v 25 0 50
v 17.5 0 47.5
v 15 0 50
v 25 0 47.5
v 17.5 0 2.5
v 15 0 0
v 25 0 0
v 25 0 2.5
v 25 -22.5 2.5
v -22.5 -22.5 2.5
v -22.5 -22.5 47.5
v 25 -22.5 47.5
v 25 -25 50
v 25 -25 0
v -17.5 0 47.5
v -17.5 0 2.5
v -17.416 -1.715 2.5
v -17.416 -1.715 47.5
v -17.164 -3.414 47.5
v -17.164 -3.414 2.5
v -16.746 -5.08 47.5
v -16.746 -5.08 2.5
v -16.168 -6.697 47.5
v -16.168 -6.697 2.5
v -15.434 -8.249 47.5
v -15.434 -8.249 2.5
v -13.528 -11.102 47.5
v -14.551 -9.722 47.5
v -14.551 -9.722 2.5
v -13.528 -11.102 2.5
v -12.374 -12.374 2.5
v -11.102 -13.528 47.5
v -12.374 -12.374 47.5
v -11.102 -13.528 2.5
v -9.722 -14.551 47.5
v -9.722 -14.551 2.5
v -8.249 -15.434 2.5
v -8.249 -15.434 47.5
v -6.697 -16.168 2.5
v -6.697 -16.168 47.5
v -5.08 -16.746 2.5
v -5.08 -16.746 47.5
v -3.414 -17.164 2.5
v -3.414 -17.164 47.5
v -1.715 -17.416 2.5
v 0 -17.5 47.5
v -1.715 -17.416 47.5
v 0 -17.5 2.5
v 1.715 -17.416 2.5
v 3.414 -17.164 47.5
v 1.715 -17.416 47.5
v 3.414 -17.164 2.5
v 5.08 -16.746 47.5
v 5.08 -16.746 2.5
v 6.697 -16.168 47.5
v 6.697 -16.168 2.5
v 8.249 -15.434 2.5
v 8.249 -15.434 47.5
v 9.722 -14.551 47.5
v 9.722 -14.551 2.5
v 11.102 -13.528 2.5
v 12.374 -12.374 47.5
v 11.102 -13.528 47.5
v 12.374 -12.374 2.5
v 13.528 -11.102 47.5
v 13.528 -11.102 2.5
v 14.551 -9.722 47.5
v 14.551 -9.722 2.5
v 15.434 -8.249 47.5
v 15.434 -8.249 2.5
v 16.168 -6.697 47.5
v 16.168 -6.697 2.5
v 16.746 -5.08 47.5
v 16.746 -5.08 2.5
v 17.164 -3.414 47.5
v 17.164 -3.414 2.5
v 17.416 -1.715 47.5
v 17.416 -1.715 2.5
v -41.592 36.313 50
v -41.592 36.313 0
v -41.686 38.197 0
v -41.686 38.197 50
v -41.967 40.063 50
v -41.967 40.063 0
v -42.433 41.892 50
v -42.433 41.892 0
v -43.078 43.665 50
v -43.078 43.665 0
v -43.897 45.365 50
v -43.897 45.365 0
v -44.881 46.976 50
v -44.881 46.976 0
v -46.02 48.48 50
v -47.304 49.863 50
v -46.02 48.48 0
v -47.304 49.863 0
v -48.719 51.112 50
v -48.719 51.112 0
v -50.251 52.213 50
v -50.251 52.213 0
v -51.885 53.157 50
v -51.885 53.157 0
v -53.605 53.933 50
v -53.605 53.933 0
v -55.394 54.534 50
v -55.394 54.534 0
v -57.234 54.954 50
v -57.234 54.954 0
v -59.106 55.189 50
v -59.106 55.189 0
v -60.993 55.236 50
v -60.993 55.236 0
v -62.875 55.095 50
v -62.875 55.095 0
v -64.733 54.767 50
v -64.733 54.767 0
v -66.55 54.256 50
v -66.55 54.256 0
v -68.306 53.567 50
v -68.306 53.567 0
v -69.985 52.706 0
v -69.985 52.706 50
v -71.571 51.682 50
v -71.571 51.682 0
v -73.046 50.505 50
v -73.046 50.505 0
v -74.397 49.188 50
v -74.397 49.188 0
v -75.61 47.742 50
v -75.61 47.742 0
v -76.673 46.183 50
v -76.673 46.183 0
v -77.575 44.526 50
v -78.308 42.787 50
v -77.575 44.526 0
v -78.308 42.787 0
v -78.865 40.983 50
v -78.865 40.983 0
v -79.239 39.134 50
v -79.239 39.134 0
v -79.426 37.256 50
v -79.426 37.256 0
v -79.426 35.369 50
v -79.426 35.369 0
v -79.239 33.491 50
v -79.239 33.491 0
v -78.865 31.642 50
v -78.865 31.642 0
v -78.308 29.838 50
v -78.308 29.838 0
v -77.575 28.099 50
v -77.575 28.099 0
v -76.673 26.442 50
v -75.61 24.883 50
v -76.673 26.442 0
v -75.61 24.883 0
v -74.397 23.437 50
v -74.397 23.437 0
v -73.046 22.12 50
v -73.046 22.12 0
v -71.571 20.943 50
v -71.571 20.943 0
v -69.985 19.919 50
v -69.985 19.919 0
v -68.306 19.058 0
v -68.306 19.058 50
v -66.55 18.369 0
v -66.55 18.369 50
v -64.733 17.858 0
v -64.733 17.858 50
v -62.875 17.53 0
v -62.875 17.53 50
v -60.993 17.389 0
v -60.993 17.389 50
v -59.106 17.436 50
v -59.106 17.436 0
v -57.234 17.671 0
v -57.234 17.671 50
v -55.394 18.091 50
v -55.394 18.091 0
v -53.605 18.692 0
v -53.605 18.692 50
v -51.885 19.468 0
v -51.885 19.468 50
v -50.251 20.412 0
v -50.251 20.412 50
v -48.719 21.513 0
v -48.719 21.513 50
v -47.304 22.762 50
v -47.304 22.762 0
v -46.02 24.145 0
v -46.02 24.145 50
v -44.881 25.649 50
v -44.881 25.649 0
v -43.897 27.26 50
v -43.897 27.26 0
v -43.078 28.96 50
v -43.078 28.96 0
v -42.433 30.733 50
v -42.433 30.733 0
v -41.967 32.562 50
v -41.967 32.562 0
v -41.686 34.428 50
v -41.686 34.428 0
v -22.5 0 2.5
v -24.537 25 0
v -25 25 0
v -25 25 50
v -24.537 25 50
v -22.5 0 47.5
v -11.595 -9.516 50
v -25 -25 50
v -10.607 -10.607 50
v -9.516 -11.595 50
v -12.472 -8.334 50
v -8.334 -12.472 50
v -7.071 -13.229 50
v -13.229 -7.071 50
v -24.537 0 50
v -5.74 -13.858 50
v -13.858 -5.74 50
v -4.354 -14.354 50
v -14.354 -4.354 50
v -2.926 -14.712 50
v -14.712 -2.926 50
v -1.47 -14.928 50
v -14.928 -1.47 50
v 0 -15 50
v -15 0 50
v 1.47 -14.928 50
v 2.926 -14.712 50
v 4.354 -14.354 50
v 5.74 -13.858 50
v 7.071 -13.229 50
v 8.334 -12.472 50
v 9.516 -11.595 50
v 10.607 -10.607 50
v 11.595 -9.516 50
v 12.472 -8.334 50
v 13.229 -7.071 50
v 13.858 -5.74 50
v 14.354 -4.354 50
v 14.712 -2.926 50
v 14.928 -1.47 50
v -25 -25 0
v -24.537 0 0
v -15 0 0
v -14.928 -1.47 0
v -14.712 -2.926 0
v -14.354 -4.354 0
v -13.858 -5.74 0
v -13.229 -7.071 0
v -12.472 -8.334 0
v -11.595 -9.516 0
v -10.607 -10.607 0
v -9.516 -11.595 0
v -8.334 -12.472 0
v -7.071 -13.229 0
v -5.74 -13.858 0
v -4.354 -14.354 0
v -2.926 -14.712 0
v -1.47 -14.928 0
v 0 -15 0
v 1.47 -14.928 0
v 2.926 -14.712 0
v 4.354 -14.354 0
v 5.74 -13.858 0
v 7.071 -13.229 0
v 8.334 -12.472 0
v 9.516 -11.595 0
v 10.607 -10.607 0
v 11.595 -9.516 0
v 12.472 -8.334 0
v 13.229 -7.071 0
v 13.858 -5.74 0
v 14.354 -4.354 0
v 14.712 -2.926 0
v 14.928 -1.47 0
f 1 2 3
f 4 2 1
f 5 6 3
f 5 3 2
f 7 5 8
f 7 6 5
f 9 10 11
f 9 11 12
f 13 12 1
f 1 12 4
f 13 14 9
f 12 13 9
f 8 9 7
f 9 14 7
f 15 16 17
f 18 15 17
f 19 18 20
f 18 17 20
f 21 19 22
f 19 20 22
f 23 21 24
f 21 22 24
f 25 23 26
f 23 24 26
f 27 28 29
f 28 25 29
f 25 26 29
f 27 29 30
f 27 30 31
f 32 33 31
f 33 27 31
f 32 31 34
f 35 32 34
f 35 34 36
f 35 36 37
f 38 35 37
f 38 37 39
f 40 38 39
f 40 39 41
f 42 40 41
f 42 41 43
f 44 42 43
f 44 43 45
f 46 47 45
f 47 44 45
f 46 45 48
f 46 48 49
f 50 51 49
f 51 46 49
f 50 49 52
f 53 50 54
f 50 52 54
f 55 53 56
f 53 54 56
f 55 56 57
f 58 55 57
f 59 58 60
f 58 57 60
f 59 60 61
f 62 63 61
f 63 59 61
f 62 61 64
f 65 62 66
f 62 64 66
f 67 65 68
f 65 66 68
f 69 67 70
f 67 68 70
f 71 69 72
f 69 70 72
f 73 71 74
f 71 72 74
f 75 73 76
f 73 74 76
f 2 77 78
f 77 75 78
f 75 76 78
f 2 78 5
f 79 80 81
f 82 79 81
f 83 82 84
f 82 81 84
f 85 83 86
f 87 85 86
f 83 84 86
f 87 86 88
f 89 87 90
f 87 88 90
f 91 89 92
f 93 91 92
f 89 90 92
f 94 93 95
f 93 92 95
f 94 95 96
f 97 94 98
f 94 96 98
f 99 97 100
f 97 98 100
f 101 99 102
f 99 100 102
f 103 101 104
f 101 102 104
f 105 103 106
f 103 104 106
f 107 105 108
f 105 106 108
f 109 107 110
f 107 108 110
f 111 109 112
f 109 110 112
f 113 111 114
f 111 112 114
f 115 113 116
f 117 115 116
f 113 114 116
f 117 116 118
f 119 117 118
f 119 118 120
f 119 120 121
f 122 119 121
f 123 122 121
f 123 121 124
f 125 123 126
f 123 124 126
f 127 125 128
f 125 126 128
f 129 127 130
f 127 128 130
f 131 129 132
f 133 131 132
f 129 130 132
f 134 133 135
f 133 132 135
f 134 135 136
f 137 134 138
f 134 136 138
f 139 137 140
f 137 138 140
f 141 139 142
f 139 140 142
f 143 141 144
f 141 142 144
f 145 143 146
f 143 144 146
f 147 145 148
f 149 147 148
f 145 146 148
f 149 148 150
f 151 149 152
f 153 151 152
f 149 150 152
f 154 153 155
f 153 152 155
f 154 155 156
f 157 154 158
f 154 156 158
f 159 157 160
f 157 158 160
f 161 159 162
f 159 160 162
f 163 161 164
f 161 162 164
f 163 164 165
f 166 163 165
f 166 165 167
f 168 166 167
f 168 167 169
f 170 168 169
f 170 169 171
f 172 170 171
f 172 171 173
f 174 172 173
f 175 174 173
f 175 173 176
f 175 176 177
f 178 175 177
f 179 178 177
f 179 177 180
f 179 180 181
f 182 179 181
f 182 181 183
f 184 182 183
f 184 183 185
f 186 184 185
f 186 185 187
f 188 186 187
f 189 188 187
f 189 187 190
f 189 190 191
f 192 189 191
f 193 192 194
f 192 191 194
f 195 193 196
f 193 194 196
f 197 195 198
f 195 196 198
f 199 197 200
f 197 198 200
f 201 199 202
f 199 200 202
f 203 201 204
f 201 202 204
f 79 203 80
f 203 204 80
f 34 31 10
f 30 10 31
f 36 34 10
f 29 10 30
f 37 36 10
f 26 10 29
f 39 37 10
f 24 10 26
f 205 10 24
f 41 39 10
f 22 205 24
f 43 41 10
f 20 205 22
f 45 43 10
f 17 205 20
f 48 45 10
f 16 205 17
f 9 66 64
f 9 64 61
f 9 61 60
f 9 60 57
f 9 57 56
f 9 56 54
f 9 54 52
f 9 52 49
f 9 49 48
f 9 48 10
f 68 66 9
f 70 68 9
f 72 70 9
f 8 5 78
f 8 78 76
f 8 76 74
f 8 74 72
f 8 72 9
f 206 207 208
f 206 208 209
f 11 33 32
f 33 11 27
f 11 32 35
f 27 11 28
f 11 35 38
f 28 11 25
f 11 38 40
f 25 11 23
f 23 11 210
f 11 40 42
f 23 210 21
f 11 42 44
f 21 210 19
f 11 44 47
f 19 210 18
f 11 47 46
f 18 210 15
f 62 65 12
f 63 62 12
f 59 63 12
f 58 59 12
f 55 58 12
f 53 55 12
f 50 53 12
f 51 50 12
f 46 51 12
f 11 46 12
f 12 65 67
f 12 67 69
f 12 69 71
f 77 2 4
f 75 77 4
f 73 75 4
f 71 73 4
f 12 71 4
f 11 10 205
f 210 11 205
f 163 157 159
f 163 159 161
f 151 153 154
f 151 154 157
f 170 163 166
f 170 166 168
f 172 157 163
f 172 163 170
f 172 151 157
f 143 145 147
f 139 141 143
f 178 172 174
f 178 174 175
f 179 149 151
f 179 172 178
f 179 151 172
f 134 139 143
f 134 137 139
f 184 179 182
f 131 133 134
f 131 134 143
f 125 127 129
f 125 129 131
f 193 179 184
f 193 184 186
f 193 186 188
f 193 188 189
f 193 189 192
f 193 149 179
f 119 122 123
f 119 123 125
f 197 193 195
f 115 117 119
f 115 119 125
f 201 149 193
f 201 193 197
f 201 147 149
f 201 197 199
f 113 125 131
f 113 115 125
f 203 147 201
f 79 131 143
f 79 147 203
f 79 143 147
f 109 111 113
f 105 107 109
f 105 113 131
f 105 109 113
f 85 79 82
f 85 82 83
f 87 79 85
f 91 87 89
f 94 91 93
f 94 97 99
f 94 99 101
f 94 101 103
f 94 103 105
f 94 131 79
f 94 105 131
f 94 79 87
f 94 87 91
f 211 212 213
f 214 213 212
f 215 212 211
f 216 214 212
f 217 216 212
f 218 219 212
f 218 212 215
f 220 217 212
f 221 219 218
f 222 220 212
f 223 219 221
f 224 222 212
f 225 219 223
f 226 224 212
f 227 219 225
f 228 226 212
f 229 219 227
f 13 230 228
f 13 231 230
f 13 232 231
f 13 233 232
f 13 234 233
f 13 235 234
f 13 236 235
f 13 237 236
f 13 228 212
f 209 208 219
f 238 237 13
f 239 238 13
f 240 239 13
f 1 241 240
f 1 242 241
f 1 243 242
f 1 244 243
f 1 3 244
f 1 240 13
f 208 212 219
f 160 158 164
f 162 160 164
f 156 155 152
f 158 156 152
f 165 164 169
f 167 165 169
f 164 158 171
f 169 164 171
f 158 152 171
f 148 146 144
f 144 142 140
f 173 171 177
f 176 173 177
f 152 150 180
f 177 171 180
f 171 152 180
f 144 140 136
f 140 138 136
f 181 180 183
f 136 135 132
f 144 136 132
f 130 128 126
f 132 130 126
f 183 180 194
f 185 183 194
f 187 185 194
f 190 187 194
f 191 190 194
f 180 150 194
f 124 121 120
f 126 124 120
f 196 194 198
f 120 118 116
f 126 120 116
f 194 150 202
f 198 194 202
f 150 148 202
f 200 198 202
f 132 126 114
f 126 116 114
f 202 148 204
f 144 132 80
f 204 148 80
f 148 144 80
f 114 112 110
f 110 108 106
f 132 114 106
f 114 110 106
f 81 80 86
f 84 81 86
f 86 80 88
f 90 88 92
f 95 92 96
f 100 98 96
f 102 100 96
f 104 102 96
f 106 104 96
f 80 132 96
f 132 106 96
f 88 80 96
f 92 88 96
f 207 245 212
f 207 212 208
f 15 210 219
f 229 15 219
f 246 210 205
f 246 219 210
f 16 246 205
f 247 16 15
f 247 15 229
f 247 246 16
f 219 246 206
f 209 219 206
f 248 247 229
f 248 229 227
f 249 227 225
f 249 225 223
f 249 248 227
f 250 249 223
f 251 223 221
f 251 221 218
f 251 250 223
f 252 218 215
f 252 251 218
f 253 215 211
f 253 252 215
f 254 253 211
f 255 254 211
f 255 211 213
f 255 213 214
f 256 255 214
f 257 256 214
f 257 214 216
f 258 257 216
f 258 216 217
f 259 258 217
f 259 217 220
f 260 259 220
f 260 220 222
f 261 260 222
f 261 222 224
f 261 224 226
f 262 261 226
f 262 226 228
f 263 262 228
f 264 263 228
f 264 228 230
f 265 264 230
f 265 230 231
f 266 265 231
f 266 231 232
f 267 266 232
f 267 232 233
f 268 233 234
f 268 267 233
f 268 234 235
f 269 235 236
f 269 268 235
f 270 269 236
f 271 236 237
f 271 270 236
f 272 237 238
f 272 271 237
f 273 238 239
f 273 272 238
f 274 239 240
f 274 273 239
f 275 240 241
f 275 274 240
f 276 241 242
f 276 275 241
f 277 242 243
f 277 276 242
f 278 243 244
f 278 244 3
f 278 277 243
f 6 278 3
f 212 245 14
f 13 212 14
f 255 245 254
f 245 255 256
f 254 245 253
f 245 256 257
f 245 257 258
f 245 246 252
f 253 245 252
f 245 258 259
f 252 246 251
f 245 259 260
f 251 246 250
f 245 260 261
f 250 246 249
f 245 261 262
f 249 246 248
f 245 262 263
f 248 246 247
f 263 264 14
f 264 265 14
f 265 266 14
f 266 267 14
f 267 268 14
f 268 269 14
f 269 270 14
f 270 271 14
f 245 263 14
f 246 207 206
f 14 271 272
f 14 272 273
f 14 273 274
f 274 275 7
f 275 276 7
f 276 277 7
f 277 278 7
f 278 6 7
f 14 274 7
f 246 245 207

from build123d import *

# Parameters (mm, degrees)
F0_W     = 50
F0_H     = 50
F1_DEPTH = 50
F2_R     = 18.929146
F3_DEPTH = 50
F4_R     = 15
F5_DEPTH = 50
F6_T     = -2.5
F7_W     = 50
F7_H     = 25
F8_DEPTH = 50


with BuildPart() as f1:
    # F0 (on Top) → F1 (new body)
    with BuildSketch(Plane.XY):
        Rectangle(F0_W, F0_H)
    extrude(amount=F1_DEPTH)

    # F4 (on Top) → F5 (cut)
    with BuildSketch(Plane.XY):
        Circle(F4_R)
    extrude(amount=F5_DEPTH, mode=Mode.SUBTRACT)

    # F6
    f6_openings = [f1.faces().sort_by_distance(p)[0] for p in [
        (25, 0, 25),
    ]]
    offset(amount=F6_T, openings=f6_openings)

    # F7 (on Top) → F8 (cut)
    with BuildSketch(Plane.XY):
        with Locations((0.462509, 12.5)):
            Rectangle(F7_W, F7_H)
    extrude(amount=F8_DEPTH, mode=Mode.SUBTRACT)


with BuildPart() as f3:
    # F2 (on Top) → F3 (new body)
    with BuildSketch(Plane.XY):
        with Locations((-60.520839, 36.312502)):
            Circle(F2_R)
    extrude(amount=F3_DEPTH)


solid = Compound([f1.part, f3.part])
